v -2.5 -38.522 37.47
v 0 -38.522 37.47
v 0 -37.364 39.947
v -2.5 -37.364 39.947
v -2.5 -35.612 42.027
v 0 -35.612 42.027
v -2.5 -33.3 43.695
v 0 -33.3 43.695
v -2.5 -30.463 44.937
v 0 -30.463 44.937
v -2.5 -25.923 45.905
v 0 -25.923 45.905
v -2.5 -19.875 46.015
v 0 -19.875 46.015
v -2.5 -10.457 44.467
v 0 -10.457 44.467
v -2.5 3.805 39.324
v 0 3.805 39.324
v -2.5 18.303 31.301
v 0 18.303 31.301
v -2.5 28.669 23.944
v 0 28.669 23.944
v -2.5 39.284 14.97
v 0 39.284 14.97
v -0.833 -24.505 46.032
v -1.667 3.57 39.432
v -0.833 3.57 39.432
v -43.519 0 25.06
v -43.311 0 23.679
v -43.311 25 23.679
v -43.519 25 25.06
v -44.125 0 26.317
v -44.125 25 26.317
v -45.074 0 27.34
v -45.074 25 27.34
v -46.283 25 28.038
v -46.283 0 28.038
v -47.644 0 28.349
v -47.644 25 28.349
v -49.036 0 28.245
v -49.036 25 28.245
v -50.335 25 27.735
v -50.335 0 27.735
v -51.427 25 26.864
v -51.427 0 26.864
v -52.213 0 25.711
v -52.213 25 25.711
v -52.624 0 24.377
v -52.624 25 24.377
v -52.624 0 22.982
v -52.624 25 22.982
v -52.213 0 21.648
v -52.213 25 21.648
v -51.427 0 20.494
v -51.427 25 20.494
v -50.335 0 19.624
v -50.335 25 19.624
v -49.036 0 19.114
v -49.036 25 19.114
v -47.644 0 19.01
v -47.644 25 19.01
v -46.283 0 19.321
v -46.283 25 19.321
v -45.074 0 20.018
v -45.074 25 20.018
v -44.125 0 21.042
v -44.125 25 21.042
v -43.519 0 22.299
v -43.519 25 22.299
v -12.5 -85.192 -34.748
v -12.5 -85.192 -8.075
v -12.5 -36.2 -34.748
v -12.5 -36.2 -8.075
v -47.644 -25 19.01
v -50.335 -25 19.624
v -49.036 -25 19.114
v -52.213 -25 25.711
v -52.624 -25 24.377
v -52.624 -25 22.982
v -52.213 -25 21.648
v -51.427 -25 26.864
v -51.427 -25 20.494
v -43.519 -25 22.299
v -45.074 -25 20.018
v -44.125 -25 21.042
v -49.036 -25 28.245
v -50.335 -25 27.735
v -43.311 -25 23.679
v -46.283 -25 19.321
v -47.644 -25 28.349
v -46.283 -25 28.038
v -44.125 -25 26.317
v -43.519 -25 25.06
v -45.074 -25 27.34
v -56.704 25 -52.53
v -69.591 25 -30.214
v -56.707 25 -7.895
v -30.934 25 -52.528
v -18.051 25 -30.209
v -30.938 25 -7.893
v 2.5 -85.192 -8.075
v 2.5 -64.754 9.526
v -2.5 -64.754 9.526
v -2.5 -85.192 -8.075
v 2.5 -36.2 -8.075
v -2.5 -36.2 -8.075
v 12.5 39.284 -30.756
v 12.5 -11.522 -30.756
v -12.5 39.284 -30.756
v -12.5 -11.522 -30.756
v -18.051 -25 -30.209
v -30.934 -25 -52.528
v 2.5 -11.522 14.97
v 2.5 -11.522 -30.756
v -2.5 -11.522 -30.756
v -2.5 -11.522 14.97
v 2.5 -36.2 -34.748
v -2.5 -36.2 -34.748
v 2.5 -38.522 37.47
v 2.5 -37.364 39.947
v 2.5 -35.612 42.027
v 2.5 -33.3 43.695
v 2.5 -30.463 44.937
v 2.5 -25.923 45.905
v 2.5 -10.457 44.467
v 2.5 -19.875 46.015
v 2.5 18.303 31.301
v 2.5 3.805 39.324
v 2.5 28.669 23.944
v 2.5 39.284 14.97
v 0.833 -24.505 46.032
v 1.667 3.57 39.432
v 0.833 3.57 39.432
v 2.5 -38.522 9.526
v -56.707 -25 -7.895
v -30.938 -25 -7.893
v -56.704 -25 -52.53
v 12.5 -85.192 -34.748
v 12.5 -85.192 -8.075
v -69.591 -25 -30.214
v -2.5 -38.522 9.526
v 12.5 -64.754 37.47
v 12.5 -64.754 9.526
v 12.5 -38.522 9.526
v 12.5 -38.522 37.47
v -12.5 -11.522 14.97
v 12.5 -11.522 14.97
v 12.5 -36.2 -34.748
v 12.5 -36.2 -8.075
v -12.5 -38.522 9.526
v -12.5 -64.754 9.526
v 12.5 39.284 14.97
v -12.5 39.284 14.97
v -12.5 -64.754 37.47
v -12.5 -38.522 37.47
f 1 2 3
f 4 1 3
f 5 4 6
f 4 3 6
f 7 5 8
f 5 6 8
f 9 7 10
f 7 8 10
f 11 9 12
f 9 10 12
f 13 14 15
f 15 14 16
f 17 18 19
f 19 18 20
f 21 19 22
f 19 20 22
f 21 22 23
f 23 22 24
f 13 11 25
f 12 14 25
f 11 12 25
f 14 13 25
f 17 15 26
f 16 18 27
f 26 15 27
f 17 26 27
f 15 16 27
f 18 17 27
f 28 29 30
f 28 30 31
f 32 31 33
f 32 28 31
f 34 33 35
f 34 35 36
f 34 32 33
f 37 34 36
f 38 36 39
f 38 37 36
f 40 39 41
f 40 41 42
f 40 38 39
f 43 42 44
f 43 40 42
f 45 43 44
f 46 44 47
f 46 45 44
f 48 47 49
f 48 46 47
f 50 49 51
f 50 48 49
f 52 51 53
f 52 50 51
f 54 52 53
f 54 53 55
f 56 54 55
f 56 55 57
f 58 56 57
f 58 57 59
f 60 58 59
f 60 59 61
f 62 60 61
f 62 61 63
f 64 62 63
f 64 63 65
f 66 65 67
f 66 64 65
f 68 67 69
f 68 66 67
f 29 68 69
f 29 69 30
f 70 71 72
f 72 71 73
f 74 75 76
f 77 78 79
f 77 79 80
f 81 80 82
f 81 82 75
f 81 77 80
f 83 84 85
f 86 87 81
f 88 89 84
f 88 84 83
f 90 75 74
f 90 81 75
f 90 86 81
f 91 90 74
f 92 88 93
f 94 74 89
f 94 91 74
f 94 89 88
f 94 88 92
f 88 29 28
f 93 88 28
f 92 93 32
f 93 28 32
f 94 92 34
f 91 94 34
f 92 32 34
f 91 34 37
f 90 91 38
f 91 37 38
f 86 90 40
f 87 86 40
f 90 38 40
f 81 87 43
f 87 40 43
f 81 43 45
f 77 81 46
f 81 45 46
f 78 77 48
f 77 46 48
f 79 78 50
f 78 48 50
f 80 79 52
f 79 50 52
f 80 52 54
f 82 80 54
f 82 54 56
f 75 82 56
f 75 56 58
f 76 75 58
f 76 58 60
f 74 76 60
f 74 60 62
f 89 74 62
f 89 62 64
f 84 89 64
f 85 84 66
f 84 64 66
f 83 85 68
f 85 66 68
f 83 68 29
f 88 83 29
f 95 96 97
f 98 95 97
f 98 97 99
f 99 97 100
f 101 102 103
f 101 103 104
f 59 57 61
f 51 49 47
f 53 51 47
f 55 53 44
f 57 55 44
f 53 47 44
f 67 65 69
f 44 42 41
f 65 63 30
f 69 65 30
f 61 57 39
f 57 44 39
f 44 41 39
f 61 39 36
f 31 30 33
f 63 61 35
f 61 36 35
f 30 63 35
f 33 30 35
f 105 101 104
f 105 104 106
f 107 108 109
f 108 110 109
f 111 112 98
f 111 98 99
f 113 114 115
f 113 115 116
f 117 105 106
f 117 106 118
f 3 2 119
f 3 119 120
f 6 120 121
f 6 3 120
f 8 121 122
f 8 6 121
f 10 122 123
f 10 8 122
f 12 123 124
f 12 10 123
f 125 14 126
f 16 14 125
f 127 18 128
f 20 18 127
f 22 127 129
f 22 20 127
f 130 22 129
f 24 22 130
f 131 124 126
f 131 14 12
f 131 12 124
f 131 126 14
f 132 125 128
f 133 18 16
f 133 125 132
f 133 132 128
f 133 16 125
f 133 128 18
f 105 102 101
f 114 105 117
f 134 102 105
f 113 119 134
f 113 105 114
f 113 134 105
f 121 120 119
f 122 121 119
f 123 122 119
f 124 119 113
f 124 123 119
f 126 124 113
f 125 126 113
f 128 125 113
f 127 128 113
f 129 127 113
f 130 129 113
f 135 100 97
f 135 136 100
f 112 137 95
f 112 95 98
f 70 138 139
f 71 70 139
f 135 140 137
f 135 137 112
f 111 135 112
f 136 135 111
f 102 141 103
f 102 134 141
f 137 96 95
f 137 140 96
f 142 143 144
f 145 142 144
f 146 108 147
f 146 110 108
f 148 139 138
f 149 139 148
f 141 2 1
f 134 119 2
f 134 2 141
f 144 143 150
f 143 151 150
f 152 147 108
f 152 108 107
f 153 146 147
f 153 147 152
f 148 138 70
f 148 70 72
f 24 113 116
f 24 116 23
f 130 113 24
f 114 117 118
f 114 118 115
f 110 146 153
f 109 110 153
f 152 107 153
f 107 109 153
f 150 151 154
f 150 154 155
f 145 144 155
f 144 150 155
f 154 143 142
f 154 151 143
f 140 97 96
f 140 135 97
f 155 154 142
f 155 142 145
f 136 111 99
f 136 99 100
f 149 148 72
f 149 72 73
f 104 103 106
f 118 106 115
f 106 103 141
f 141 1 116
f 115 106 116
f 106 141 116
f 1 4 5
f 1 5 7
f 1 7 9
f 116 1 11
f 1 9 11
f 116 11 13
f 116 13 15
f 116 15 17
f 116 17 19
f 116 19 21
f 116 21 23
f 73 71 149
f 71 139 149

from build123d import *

# Parameters (mm, degrees)
F0_W     = 26.232722
F0_H     = 27.943549
F0_W_2   = 50.806452
F0_H_2   = 45.725806
F0_W_3   = 48.991933
F0_H_3   = 26.673385
F1_DEPTH = 12.5
F2_DEPTH = 2.5
F3_R     = 4.682563
F4_DEPTH = 25


with BuildPart() as f1:
    # F0 (on Right) → F1 (new body, symmetric)
    with BuildSketch(Plane.YZ):
        with Locations((-51.638104, 23.497985)):
            Rectangle(F0_W, F0_H)
        with Locations((13.881048, -7.893146)):
            Rectangle(F0_W_2, F0_H_2)
        with Locations((-60.695566, -21.411289)):
            Rectangle(F0_W_3, F0_H_3)
    extrude(amount=F1_DEPTH, both=True)


with BuildPart() as f2:
    # F0 (on Right) → F2 (new body, symmetric)
    with BuildSketch(Plane.YZ):
        Polygon((-38.521743, 9.526211), (-64.754465, 9.526211), (-85.191533, -8.074597), (-36.1996, -8.074597), (-36.1996, -34.747982), (-11.522178, -30.756049), (-11.522178, 14.969757), (-38.521743, 37.46976), align=None)
        with BuildLine():
            add(Edge.make_bspline(
                [(-38.521743, 37.46976), (-33.674397, 52.711695), (1.890125, 49.264114), (39.284274, 14.969757)],
                knots=[0, 0, 0, 0, 80.99399, 80.99399, 80.99399, 80.99399], degree=3))
            Line((-38.521743, 37.46976), (-11.522178, 14.969757))
            Line((-11.522178, 14.969757), (39.284274, 14.969757))
        make_face()
    extrude(amount=F2_DEPTH, both=True)


with BuildPart() as f4:
    # F3 (on Front) → F4 (new body, symmetric)
    with BuildSketch(Plane.XZ):
        with Locations((-47.993954, 23.679437)):
            Circle(F3_R)
        Polygon((-69.590533, -30.213908), (-56.703635, -52.530247), (-30.933669, -52.528035), (-18.050602, -30.209485), (-30.9375, -7.893146), (-56.707465, -7.895358), align=None)
    extrude(amount=F4_DEPTH, both=True)


solid = Compound([f1.part, f2.part, f4.part])
